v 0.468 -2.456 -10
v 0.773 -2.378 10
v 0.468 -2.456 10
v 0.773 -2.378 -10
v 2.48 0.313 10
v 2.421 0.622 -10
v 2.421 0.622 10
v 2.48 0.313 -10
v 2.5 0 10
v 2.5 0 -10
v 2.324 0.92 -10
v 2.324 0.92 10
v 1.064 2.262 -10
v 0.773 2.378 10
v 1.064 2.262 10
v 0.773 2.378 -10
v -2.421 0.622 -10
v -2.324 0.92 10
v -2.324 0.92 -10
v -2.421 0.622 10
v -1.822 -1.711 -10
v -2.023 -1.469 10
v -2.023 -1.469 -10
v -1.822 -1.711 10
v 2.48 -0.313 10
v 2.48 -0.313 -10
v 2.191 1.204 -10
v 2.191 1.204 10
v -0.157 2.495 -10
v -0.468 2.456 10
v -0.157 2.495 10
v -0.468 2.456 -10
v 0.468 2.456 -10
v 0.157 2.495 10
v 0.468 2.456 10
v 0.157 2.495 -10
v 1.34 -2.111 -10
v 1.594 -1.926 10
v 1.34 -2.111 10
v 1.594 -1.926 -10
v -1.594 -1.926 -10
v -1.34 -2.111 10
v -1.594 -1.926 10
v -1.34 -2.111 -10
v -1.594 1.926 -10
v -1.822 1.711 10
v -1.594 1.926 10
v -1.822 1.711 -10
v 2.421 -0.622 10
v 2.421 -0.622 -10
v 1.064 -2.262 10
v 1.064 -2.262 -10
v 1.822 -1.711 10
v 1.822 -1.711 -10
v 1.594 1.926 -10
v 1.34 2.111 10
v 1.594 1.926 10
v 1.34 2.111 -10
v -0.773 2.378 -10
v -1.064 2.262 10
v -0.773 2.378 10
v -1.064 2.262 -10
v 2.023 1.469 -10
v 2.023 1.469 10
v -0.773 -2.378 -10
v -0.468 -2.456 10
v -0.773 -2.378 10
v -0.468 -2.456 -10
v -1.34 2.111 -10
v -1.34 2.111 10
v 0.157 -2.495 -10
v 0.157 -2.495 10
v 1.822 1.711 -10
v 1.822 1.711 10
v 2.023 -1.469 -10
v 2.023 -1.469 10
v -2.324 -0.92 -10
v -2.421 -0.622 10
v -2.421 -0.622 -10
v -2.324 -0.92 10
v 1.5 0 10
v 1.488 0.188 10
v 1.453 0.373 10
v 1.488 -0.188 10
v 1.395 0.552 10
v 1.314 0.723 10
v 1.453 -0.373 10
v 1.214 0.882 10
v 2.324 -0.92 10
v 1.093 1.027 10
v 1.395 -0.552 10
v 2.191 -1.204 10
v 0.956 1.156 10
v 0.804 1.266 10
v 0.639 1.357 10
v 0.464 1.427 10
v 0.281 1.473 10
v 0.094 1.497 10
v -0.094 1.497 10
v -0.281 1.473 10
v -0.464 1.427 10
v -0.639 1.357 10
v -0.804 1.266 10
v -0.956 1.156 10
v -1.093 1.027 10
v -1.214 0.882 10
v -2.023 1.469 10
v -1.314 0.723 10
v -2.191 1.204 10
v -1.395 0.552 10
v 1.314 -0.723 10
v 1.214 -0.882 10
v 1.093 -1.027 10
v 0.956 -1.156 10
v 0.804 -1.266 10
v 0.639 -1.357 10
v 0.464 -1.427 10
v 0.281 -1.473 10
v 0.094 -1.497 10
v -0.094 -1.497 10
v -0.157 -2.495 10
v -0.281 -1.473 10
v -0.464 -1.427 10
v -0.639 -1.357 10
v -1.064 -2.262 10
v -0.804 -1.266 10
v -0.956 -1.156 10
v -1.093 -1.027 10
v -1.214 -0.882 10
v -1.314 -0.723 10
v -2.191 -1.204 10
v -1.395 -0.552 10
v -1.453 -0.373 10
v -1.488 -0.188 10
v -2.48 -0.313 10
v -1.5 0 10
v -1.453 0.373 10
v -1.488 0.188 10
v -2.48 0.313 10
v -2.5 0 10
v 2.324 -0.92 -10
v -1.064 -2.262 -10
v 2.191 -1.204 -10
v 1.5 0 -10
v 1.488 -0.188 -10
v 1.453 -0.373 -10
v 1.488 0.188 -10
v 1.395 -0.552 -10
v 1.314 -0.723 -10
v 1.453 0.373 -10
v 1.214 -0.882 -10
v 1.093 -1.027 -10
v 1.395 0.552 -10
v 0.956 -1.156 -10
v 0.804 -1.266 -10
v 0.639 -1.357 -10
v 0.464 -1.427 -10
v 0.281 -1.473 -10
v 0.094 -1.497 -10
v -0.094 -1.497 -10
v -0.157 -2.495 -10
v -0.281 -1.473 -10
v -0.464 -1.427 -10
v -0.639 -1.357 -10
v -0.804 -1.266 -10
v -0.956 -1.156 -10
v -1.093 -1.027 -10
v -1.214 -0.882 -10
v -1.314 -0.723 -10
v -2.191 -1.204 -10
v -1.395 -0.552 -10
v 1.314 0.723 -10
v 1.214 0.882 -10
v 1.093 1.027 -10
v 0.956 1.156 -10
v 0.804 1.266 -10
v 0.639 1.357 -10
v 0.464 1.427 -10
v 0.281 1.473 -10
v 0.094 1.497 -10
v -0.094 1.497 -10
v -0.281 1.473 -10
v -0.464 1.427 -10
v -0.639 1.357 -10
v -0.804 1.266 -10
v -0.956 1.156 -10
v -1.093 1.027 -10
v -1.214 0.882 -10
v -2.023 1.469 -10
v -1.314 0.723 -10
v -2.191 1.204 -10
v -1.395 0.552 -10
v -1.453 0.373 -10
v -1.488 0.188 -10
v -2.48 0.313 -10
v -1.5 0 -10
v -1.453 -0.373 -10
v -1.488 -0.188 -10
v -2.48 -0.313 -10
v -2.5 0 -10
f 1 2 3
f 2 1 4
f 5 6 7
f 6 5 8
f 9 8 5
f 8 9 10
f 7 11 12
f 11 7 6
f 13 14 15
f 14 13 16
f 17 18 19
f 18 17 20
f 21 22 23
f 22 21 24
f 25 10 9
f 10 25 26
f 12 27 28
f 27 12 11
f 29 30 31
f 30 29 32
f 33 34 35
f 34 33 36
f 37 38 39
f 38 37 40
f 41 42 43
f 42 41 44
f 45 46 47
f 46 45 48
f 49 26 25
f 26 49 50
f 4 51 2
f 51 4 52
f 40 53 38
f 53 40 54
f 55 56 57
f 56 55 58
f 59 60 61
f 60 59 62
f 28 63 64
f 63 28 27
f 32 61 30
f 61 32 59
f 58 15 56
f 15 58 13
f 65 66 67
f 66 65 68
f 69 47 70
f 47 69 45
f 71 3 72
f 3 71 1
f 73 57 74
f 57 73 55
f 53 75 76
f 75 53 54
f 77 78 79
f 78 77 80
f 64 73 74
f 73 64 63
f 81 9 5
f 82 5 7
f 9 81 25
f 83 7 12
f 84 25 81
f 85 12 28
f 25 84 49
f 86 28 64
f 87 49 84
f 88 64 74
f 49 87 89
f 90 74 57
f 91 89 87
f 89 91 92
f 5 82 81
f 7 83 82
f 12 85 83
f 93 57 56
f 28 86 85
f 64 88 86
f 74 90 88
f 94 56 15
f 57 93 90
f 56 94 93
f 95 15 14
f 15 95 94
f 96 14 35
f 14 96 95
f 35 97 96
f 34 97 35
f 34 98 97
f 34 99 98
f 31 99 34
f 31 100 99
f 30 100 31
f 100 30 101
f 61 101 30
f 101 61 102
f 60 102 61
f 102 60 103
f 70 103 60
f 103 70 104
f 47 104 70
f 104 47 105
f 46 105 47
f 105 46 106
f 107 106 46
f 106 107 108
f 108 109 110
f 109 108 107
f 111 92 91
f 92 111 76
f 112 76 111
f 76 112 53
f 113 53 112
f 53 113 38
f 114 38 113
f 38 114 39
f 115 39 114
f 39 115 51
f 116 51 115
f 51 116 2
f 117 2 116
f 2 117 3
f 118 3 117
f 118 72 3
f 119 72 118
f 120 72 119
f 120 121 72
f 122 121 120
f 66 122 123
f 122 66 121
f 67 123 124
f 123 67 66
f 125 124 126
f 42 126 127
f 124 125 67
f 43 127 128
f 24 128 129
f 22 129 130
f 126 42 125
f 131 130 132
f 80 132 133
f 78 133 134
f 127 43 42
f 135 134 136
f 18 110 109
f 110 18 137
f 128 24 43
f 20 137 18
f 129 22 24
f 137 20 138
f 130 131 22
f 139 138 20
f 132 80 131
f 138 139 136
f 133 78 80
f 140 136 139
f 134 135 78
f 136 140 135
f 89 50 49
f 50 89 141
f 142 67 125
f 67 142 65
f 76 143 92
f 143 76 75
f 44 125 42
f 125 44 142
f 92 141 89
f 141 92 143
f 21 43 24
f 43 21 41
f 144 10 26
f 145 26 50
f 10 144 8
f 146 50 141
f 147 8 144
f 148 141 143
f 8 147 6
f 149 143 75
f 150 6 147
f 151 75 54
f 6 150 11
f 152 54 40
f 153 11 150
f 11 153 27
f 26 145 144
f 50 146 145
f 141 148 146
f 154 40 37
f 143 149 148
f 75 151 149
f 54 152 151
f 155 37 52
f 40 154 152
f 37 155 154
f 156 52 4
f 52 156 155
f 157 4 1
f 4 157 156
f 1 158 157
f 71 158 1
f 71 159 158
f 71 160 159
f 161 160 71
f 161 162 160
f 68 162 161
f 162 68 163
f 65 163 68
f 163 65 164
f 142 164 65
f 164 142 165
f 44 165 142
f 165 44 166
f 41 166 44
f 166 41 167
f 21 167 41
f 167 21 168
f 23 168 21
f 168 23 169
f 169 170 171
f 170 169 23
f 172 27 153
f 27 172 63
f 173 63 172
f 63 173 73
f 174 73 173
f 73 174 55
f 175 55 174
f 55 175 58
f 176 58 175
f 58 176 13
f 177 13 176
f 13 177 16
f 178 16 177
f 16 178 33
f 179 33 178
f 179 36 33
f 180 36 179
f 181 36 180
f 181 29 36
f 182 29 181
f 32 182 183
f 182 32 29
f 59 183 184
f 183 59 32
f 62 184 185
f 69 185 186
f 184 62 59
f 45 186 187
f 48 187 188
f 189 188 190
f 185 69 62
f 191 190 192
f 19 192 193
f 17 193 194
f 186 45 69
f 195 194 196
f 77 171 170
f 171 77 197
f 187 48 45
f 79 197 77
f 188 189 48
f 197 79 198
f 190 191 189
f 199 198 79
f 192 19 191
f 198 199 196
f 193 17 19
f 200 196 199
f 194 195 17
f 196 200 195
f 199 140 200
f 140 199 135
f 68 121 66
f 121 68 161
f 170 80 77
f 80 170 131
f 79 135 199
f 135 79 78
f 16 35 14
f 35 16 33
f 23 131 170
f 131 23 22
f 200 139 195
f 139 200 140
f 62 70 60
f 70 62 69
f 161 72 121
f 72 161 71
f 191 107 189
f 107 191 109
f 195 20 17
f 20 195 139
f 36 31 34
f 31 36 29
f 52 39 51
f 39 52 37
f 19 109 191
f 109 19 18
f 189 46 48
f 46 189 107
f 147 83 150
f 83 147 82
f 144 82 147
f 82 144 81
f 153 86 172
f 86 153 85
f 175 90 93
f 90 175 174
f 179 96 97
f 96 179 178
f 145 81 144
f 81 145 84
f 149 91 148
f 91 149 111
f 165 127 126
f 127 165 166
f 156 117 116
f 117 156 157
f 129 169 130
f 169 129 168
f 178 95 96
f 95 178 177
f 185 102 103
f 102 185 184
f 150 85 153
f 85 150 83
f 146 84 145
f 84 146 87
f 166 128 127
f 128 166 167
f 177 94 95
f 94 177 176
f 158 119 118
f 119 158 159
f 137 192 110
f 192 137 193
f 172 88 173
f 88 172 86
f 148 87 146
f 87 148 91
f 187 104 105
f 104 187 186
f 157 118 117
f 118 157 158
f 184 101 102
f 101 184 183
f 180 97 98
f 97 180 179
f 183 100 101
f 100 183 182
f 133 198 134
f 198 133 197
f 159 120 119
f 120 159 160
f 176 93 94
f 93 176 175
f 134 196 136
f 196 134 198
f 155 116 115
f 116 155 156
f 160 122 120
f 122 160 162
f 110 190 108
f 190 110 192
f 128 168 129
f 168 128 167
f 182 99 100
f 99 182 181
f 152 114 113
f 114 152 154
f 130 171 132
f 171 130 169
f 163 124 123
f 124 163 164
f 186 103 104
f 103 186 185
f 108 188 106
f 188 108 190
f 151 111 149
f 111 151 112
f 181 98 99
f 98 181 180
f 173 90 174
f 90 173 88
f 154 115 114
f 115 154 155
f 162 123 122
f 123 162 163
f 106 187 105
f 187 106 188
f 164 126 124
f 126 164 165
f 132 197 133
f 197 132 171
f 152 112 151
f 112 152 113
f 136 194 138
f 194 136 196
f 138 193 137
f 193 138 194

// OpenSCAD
$fn = 50;


difference() {
	union() {
		translate(v = [0, 0, -10.0000000000]) {
			cylinder(h = 20, r = 2.5000000000);
		}
	}
	union() {
		translate(v = [0, 0, -100.0000000000]) {
			cylinder(h = 200, r = 1.5000000000);
		}
	}
}
